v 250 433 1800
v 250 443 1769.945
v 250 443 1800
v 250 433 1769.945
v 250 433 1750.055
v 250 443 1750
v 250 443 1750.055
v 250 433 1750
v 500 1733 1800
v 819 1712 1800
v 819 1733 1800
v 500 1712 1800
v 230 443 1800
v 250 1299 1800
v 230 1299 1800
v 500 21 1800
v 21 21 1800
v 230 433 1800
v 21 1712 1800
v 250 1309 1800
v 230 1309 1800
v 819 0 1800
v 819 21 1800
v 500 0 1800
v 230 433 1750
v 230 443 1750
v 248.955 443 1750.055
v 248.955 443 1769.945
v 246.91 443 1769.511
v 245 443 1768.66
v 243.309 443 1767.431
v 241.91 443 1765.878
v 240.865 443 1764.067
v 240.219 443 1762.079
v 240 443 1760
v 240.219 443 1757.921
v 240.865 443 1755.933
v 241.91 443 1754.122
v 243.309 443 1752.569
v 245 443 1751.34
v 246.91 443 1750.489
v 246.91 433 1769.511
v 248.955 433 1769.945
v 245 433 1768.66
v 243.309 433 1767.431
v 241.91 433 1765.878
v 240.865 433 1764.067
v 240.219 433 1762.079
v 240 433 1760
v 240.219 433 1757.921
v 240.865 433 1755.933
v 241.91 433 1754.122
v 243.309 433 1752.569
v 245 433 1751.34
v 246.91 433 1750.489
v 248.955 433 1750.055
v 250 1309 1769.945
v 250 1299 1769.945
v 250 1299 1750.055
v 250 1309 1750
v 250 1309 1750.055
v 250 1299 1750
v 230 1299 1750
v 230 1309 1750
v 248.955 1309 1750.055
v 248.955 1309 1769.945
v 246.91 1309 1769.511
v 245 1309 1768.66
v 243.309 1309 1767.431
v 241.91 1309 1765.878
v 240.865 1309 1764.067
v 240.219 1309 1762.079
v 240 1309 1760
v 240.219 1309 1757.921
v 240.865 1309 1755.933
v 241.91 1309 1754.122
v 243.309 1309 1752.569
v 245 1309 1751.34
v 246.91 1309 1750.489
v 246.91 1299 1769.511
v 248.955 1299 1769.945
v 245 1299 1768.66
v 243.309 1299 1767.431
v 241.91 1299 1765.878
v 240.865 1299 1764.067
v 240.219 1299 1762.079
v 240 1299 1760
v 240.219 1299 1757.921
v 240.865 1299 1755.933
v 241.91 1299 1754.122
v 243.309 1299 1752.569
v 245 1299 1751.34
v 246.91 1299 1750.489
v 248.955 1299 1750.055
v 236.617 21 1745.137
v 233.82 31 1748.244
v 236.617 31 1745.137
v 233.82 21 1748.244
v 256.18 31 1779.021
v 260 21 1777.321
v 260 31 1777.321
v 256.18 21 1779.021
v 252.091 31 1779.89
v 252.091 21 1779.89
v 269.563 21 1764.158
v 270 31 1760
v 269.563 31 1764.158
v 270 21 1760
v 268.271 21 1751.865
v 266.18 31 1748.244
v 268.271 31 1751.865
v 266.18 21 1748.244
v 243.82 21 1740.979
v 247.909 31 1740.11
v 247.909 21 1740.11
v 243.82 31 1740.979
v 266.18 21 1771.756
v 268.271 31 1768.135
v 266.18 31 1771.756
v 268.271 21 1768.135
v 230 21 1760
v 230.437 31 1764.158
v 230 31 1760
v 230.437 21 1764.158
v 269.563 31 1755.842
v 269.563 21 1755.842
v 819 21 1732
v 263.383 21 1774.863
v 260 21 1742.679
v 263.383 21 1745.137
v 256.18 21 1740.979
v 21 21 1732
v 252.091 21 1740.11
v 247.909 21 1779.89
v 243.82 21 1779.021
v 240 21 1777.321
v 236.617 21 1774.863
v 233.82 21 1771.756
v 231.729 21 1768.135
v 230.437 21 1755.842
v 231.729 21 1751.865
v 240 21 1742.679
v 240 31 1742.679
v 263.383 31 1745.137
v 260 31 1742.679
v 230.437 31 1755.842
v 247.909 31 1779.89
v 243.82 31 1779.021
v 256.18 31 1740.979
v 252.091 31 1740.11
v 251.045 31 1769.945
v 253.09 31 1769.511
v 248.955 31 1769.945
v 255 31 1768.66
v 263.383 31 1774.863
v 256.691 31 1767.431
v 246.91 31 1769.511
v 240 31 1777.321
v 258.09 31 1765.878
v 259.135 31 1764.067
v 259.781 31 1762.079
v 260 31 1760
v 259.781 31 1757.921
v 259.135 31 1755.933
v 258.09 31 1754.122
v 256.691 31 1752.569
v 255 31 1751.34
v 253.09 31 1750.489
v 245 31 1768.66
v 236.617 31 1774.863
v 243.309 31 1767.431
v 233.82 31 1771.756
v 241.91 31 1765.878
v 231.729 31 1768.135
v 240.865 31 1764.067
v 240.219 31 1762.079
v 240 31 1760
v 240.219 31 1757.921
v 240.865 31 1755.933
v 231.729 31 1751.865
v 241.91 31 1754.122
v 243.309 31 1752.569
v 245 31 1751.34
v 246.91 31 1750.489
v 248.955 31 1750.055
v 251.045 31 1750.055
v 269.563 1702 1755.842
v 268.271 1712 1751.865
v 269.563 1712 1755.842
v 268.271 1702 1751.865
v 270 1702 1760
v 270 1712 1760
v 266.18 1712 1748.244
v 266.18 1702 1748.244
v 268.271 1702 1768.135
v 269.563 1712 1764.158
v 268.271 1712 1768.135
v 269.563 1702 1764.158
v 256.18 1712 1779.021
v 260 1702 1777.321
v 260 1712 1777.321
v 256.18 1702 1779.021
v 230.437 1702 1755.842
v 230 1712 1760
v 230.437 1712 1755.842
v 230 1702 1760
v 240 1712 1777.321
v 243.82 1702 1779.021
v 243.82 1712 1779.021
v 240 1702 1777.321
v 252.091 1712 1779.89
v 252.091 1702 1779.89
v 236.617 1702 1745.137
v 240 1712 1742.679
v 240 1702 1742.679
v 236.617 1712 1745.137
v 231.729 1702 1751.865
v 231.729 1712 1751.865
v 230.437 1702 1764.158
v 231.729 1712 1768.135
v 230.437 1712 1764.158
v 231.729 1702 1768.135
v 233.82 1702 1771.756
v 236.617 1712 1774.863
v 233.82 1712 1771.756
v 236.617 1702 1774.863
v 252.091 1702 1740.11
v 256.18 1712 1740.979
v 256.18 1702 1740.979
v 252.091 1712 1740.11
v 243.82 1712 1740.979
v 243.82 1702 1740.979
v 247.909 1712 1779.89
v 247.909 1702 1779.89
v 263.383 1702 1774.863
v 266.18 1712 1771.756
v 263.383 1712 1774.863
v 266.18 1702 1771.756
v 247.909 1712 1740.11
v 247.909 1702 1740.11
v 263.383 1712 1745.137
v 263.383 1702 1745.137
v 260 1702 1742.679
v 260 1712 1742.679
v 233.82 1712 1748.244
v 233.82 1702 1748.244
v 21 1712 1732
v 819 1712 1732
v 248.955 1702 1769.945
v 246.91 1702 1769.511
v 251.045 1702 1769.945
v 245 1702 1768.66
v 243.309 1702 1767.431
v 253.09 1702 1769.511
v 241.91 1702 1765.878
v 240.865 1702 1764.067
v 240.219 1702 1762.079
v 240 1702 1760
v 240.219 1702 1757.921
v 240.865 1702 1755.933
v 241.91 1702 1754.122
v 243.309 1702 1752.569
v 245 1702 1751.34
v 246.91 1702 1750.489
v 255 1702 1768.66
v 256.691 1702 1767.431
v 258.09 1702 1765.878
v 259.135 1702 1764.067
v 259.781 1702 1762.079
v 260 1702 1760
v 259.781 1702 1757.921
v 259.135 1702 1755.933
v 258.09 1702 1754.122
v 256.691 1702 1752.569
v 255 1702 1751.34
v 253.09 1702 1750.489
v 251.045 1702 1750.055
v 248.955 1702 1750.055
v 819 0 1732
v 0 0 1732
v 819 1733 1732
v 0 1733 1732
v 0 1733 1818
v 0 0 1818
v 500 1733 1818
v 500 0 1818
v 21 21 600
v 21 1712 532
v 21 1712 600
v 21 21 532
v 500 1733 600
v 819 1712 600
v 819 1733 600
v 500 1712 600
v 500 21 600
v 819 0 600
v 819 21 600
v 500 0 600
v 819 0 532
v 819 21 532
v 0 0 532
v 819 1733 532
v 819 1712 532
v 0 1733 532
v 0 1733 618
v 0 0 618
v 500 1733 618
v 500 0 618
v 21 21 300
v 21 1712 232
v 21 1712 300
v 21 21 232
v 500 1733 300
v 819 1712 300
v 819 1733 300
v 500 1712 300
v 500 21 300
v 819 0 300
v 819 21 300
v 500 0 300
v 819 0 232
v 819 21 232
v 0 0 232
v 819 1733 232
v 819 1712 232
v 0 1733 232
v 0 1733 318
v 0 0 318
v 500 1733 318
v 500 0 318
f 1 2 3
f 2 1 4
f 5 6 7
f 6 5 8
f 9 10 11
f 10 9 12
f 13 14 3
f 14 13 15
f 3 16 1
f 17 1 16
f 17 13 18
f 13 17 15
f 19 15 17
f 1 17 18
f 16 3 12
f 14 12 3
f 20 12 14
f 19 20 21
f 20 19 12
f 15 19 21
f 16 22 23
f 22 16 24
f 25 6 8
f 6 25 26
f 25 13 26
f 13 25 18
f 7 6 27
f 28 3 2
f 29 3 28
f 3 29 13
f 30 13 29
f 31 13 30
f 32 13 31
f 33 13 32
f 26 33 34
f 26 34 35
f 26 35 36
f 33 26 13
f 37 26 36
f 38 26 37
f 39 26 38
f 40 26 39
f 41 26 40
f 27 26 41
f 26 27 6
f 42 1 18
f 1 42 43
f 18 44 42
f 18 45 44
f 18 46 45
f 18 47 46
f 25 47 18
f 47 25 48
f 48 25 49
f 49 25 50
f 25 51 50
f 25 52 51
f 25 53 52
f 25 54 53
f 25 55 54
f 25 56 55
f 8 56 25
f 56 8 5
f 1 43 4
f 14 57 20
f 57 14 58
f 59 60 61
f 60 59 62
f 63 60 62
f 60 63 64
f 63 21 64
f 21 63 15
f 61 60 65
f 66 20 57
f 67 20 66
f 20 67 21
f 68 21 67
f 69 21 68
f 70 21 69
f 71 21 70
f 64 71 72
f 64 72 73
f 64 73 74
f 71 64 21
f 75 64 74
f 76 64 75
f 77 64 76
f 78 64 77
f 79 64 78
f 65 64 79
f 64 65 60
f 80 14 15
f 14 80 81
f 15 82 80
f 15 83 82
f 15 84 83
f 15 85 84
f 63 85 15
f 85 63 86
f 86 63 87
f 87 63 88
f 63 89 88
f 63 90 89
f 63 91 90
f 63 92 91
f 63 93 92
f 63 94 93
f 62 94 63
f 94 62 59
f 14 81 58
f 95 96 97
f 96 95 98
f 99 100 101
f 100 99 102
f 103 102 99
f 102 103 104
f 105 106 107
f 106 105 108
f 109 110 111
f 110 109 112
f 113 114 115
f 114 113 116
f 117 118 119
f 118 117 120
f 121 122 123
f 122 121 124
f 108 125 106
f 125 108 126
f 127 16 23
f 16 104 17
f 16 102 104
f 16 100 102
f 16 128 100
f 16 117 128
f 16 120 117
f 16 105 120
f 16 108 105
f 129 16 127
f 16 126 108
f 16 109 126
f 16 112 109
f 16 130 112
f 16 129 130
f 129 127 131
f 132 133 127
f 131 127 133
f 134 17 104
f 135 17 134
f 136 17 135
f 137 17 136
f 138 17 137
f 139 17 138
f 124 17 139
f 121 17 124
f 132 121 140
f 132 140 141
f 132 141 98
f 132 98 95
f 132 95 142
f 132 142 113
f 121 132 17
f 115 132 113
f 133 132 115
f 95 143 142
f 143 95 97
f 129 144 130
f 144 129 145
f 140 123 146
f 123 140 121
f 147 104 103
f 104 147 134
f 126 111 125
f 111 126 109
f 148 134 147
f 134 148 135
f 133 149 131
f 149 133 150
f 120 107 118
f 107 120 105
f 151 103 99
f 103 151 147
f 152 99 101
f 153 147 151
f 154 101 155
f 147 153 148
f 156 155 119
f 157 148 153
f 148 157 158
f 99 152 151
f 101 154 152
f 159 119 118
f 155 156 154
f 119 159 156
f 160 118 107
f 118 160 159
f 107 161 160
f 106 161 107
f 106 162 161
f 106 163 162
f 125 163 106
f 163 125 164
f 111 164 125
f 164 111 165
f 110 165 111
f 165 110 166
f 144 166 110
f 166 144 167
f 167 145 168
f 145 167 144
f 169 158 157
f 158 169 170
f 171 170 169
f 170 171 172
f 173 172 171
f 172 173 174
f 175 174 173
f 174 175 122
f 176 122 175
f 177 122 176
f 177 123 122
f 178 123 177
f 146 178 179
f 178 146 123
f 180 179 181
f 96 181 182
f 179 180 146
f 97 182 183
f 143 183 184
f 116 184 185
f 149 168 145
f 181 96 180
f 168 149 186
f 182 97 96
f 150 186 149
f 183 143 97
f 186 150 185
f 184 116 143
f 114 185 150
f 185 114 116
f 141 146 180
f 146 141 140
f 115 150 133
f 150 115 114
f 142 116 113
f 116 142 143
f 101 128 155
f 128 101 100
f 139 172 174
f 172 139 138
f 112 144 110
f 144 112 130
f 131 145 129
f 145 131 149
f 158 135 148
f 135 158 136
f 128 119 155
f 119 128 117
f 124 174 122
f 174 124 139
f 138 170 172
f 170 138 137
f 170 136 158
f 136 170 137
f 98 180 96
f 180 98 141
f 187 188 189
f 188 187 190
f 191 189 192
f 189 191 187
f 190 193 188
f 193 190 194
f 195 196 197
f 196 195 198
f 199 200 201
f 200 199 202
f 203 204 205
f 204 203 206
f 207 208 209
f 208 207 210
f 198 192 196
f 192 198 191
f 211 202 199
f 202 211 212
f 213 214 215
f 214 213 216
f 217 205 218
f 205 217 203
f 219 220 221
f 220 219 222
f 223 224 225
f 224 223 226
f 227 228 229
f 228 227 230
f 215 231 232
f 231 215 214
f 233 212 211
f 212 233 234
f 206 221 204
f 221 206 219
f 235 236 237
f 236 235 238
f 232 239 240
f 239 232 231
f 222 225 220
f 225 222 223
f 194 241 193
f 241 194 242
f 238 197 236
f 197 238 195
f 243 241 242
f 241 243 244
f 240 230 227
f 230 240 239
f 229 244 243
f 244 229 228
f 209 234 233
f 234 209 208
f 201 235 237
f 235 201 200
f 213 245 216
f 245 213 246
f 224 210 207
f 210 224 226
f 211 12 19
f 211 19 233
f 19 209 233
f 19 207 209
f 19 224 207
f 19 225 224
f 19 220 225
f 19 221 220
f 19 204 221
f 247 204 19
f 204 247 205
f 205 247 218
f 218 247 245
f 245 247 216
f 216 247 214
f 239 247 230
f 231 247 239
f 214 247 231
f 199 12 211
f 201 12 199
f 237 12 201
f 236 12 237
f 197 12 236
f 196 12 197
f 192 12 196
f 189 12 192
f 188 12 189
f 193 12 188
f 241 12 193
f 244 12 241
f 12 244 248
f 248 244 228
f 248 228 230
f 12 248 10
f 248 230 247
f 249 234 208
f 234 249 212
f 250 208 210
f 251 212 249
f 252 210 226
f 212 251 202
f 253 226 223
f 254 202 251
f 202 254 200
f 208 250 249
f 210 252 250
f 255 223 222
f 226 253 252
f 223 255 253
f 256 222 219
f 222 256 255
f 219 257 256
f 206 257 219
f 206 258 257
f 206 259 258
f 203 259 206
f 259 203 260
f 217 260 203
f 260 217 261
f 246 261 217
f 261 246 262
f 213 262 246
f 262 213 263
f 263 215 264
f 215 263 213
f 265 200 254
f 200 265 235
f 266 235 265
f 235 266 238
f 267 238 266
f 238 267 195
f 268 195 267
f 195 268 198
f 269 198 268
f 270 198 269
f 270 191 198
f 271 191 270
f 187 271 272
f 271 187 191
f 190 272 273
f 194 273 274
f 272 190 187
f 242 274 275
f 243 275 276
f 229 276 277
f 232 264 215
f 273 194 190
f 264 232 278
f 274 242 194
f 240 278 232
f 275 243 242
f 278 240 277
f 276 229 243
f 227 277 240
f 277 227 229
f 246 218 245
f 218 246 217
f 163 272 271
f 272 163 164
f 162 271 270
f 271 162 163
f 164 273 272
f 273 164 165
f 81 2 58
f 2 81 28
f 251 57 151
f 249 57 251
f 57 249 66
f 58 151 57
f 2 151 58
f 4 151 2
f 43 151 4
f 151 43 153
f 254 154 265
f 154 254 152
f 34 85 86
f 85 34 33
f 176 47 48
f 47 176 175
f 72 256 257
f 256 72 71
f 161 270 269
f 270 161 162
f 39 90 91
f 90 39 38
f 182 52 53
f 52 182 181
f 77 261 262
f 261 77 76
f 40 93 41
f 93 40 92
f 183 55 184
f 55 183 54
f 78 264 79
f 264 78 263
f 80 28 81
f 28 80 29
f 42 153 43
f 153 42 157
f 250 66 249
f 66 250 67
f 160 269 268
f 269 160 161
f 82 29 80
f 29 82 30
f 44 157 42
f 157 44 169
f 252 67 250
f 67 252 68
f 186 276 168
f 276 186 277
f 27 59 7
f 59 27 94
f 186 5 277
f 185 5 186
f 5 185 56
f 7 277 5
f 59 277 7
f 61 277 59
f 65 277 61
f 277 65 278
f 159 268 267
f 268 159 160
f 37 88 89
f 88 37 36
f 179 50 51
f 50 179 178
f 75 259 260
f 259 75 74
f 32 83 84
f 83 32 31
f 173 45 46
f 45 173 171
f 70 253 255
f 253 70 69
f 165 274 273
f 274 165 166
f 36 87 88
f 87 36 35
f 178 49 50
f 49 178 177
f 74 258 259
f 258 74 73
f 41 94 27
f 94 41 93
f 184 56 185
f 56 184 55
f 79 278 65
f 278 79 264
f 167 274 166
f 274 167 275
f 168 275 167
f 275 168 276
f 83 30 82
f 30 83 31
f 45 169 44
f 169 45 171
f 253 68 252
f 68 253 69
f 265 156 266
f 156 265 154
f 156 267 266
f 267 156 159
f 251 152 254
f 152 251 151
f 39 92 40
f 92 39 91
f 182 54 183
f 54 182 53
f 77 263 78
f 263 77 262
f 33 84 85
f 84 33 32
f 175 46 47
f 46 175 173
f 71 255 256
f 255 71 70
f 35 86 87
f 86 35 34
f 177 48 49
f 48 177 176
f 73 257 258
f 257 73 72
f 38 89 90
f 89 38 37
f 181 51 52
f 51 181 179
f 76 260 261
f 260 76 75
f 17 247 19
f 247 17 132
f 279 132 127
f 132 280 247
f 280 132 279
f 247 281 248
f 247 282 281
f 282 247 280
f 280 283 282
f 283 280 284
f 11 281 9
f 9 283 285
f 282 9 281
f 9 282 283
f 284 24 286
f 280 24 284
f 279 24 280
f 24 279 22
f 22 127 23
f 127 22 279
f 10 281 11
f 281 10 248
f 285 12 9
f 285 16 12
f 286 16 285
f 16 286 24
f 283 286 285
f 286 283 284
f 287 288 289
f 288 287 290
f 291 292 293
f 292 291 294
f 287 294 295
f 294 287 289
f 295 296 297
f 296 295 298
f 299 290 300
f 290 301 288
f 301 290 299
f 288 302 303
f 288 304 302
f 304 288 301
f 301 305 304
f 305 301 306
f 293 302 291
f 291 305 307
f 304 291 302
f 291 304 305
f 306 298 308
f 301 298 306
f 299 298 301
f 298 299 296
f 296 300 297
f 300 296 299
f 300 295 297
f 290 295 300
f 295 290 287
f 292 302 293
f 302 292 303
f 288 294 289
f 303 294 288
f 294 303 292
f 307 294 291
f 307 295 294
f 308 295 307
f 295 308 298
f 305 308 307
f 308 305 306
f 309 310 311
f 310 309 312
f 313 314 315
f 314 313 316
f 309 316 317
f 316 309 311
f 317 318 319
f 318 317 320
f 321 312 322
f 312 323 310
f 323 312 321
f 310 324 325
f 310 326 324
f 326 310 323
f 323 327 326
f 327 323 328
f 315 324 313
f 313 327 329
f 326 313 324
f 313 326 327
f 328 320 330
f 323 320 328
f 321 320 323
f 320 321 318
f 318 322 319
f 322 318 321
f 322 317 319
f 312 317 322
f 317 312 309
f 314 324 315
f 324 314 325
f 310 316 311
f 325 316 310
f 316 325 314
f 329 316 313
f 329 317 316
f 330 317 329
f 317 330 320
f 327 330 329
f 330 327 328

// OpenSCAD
// file: lib/wardrobe.scad
// Bedroom Wardrobe CAD
// Tips/lessons:
// - Build modules relative to 0,0,0, then translate into place later.
// - Dimensions are measured length (across), width (away), height (up).
// - This matches to y, x, z here.
// - Dimensions are also relative, so no necessarily x, y, z.
// - Use functions to represent dimensions

// Wardrobe dimensions
function wd_length() = 1733; // Y
function wd_width() = 0819; // X
function wd_height() = 2398; // Z

// Skirting dimensions
function wd_skirting_width() = 16;
function wd_skirting_height() = 145;

// Shelf dimensions
// Cut length to size.
function wd_shelf_height() = 18;
function wd_shelf_width() = 500;

// Batten dimensions
// Battens hold up shelves, cut height to size, and translate into place
// Notes: length and width of batton doesn't map directly to xyz
function wd_batten_large_length() = 68;
function wd_batten_large_width() = 21;

// Clothes rail dimensions
function wd_rail_radius() = 10;
function wd_rail_z() = -40;

module wd_wall_with_door() {
	door_length = 1381;
	door_height = 2000;
	border_length = (wd_length() - door_length) / 2;
	difference() {
		// border
		square([wd_height(), wd_length()]);
		// opening
		translate([0, border_length, 0])
			square([door_height, door_length]);
	}
}

module wd_skirting_rear() {
	cube([wd_skirting_width(), wd_length(), wd_skirting_height()]);
}

module wd_skirting_side() {
	cube([wd_width(), wd_skirting_width(), wd_skirting_height()]);
}

// Walls, guidance only 2D shapes
module wd_walls() {
	// base
	square([wd_width(), wd_length()]);
	// rear
	rotate(-90, [0, 1, 0])
		square([wd_height(), wd_length()]);
	// door
	translate([wd_width(), 0, 0])
		rotate(-90, [0, 1, 0])
		wd_wall_with_door();

	wd_skirting_rear();
	wd_skirting_side();
	translate([0, wd_length()-wd_skirting_width(), 0])
		wd_skirting_side();
}

module _crail_support(shelf_width, y) {
	h = 50;
	w = 20;
	l = 10;
	translate([shelf_width / 2 - w, y, 0 - h])
		cube([w, l, h]);
}

// Clothes rail full length, underneath shelf_height, centred on shelf_width.
module wd_crail_full(shelf_width) {
	// rail ends screw into the battens
	rail_end_radius = 20;
	rail_end_height = 10;
	rail_end_y = [wd_batten_large_width(),
		wd_length()-wd_batten_large_width()-rail_end_height];

	// rail supports suspend from the shelf
	rail_supports_y = [433, 1299];

	// Height of the pole if it were standing up
	rail_height = wd_length() - wd_batten_large_width() * 2;

	// Positioned half way under shelf_width and suspended z mm
	rail_x = shelf_width / 2;

	// rail
	translate([rail_x, wd_batten_large_width(), wd_rail_z()])
		rotate(-90, [1, 0, 0])
		cylinder(rail_height, wd_rail_radius(), wd_rail_radius());
	
	// supports
	for (i = rail_supports_y) {
		_crail_support(shelf_width, i);
	}
	for (i = rail_end_y) {
		translate([rail_x, i, wd_rail_z()])
			rotate(-90, [1, 0, 0])
			cylinder(rail_end_height, rail_end_radius,
				rail_end_radius);
	}
}

// Batten on the rear wall
module wd_batten_rear_large(length=wd_length()) {
	translate([0, 0, 0-wd_batten_large_length()])
	    cube([wd_batten_large_width(), length, wd_batten_large_length()]);
}

module wd_batten_side_large() {
	batten_rear_width = wd_batten_large_width();
	length = wd_batten_large_width();
	width = wd_width() - wd_batten_large_width();
	height = wd_batten_large_length();
	translate([batten_rear_width, 0, 0-wd_batten_large_length()])
		cube([width, length, height]);
}

// Create a full sized shelf
module wd_shelf_full(rail=false) {
	// Battens
	wd_batten_rear_large();
	wd_batten_side_large();
	translate([0, wd_length()-wd_batten_large_width(), 0])
		wd_batten_side_large();

	// Shelf
	cube([wd_shelf_width(), wd_length(), wd_shelf_height()]);

	if (rail) {
		wd_crail_full(wd_shelf_width());
	}
}

// Wardrobe divider wall
// Set cutout to true to cut out rail, batten, skirting holes
module wd_div_wall(height, cutout=false) {
	if (cutout) {
		difference() {
			cube([wd_shelf_width(), wd_shelf_height(), height]);
			// Cutout for rail
			// Note: When you build this, drill a nice hole
			c_rail_x = wd_shelf_width() / 2 - wd_rail_radius();
			c_rail_height = abs(wd_rail_z()) + wd_rail_radius();
			translate([c_rail_x, 0, height])
				mirror([0, 0, 1])
				cube([wd_rail_radius() * 2,
					wd_shelf_height(),
					c_rail_height]);
			// batten
			translate([0, 0, height])
				mirror([0, 0, 1])
				cube([wd_batten_large_width(),
					wd_shelf_height(),
					wd_batten_large_length()]);
			// skirting
			cube([wd_skirting_width(),
				wd_shelf_height(),
				wd_skirting_height()]);
		}
	} else {
		cube([wd_shelf_width(), wd_shelf_height(), height]);
	}
}

function wd_shelf_left_length_default() = 
	wd_length() / 2 - wd_shelf_height() / 2;

module wd_shelf_left(length=wd_shelf_left_length_default()) {
	wd_batten_side_large();
	wd_batten_rear_large(length / 2);
	cube([wd_shelf_width(), length, wd_shelf_height()]);
}

module wd_shelf_right(length=wd_shelf_left_length_default()) {
	translate([0, wd_length(), 0])
	mirror([0, 1, 0])
		wd_shelf_left(length);
}
// main file
// Main shelf with rail, two low shelves
use <lib/wardrobe.scad>

% wd_walls();
translate([0, 0, 1800])
	wd_shelf_full(rail=true);
translate([0, 0, 600])
	wd_shelf_full();
translate([0, 0, 300])
	wd_shelf_full();
